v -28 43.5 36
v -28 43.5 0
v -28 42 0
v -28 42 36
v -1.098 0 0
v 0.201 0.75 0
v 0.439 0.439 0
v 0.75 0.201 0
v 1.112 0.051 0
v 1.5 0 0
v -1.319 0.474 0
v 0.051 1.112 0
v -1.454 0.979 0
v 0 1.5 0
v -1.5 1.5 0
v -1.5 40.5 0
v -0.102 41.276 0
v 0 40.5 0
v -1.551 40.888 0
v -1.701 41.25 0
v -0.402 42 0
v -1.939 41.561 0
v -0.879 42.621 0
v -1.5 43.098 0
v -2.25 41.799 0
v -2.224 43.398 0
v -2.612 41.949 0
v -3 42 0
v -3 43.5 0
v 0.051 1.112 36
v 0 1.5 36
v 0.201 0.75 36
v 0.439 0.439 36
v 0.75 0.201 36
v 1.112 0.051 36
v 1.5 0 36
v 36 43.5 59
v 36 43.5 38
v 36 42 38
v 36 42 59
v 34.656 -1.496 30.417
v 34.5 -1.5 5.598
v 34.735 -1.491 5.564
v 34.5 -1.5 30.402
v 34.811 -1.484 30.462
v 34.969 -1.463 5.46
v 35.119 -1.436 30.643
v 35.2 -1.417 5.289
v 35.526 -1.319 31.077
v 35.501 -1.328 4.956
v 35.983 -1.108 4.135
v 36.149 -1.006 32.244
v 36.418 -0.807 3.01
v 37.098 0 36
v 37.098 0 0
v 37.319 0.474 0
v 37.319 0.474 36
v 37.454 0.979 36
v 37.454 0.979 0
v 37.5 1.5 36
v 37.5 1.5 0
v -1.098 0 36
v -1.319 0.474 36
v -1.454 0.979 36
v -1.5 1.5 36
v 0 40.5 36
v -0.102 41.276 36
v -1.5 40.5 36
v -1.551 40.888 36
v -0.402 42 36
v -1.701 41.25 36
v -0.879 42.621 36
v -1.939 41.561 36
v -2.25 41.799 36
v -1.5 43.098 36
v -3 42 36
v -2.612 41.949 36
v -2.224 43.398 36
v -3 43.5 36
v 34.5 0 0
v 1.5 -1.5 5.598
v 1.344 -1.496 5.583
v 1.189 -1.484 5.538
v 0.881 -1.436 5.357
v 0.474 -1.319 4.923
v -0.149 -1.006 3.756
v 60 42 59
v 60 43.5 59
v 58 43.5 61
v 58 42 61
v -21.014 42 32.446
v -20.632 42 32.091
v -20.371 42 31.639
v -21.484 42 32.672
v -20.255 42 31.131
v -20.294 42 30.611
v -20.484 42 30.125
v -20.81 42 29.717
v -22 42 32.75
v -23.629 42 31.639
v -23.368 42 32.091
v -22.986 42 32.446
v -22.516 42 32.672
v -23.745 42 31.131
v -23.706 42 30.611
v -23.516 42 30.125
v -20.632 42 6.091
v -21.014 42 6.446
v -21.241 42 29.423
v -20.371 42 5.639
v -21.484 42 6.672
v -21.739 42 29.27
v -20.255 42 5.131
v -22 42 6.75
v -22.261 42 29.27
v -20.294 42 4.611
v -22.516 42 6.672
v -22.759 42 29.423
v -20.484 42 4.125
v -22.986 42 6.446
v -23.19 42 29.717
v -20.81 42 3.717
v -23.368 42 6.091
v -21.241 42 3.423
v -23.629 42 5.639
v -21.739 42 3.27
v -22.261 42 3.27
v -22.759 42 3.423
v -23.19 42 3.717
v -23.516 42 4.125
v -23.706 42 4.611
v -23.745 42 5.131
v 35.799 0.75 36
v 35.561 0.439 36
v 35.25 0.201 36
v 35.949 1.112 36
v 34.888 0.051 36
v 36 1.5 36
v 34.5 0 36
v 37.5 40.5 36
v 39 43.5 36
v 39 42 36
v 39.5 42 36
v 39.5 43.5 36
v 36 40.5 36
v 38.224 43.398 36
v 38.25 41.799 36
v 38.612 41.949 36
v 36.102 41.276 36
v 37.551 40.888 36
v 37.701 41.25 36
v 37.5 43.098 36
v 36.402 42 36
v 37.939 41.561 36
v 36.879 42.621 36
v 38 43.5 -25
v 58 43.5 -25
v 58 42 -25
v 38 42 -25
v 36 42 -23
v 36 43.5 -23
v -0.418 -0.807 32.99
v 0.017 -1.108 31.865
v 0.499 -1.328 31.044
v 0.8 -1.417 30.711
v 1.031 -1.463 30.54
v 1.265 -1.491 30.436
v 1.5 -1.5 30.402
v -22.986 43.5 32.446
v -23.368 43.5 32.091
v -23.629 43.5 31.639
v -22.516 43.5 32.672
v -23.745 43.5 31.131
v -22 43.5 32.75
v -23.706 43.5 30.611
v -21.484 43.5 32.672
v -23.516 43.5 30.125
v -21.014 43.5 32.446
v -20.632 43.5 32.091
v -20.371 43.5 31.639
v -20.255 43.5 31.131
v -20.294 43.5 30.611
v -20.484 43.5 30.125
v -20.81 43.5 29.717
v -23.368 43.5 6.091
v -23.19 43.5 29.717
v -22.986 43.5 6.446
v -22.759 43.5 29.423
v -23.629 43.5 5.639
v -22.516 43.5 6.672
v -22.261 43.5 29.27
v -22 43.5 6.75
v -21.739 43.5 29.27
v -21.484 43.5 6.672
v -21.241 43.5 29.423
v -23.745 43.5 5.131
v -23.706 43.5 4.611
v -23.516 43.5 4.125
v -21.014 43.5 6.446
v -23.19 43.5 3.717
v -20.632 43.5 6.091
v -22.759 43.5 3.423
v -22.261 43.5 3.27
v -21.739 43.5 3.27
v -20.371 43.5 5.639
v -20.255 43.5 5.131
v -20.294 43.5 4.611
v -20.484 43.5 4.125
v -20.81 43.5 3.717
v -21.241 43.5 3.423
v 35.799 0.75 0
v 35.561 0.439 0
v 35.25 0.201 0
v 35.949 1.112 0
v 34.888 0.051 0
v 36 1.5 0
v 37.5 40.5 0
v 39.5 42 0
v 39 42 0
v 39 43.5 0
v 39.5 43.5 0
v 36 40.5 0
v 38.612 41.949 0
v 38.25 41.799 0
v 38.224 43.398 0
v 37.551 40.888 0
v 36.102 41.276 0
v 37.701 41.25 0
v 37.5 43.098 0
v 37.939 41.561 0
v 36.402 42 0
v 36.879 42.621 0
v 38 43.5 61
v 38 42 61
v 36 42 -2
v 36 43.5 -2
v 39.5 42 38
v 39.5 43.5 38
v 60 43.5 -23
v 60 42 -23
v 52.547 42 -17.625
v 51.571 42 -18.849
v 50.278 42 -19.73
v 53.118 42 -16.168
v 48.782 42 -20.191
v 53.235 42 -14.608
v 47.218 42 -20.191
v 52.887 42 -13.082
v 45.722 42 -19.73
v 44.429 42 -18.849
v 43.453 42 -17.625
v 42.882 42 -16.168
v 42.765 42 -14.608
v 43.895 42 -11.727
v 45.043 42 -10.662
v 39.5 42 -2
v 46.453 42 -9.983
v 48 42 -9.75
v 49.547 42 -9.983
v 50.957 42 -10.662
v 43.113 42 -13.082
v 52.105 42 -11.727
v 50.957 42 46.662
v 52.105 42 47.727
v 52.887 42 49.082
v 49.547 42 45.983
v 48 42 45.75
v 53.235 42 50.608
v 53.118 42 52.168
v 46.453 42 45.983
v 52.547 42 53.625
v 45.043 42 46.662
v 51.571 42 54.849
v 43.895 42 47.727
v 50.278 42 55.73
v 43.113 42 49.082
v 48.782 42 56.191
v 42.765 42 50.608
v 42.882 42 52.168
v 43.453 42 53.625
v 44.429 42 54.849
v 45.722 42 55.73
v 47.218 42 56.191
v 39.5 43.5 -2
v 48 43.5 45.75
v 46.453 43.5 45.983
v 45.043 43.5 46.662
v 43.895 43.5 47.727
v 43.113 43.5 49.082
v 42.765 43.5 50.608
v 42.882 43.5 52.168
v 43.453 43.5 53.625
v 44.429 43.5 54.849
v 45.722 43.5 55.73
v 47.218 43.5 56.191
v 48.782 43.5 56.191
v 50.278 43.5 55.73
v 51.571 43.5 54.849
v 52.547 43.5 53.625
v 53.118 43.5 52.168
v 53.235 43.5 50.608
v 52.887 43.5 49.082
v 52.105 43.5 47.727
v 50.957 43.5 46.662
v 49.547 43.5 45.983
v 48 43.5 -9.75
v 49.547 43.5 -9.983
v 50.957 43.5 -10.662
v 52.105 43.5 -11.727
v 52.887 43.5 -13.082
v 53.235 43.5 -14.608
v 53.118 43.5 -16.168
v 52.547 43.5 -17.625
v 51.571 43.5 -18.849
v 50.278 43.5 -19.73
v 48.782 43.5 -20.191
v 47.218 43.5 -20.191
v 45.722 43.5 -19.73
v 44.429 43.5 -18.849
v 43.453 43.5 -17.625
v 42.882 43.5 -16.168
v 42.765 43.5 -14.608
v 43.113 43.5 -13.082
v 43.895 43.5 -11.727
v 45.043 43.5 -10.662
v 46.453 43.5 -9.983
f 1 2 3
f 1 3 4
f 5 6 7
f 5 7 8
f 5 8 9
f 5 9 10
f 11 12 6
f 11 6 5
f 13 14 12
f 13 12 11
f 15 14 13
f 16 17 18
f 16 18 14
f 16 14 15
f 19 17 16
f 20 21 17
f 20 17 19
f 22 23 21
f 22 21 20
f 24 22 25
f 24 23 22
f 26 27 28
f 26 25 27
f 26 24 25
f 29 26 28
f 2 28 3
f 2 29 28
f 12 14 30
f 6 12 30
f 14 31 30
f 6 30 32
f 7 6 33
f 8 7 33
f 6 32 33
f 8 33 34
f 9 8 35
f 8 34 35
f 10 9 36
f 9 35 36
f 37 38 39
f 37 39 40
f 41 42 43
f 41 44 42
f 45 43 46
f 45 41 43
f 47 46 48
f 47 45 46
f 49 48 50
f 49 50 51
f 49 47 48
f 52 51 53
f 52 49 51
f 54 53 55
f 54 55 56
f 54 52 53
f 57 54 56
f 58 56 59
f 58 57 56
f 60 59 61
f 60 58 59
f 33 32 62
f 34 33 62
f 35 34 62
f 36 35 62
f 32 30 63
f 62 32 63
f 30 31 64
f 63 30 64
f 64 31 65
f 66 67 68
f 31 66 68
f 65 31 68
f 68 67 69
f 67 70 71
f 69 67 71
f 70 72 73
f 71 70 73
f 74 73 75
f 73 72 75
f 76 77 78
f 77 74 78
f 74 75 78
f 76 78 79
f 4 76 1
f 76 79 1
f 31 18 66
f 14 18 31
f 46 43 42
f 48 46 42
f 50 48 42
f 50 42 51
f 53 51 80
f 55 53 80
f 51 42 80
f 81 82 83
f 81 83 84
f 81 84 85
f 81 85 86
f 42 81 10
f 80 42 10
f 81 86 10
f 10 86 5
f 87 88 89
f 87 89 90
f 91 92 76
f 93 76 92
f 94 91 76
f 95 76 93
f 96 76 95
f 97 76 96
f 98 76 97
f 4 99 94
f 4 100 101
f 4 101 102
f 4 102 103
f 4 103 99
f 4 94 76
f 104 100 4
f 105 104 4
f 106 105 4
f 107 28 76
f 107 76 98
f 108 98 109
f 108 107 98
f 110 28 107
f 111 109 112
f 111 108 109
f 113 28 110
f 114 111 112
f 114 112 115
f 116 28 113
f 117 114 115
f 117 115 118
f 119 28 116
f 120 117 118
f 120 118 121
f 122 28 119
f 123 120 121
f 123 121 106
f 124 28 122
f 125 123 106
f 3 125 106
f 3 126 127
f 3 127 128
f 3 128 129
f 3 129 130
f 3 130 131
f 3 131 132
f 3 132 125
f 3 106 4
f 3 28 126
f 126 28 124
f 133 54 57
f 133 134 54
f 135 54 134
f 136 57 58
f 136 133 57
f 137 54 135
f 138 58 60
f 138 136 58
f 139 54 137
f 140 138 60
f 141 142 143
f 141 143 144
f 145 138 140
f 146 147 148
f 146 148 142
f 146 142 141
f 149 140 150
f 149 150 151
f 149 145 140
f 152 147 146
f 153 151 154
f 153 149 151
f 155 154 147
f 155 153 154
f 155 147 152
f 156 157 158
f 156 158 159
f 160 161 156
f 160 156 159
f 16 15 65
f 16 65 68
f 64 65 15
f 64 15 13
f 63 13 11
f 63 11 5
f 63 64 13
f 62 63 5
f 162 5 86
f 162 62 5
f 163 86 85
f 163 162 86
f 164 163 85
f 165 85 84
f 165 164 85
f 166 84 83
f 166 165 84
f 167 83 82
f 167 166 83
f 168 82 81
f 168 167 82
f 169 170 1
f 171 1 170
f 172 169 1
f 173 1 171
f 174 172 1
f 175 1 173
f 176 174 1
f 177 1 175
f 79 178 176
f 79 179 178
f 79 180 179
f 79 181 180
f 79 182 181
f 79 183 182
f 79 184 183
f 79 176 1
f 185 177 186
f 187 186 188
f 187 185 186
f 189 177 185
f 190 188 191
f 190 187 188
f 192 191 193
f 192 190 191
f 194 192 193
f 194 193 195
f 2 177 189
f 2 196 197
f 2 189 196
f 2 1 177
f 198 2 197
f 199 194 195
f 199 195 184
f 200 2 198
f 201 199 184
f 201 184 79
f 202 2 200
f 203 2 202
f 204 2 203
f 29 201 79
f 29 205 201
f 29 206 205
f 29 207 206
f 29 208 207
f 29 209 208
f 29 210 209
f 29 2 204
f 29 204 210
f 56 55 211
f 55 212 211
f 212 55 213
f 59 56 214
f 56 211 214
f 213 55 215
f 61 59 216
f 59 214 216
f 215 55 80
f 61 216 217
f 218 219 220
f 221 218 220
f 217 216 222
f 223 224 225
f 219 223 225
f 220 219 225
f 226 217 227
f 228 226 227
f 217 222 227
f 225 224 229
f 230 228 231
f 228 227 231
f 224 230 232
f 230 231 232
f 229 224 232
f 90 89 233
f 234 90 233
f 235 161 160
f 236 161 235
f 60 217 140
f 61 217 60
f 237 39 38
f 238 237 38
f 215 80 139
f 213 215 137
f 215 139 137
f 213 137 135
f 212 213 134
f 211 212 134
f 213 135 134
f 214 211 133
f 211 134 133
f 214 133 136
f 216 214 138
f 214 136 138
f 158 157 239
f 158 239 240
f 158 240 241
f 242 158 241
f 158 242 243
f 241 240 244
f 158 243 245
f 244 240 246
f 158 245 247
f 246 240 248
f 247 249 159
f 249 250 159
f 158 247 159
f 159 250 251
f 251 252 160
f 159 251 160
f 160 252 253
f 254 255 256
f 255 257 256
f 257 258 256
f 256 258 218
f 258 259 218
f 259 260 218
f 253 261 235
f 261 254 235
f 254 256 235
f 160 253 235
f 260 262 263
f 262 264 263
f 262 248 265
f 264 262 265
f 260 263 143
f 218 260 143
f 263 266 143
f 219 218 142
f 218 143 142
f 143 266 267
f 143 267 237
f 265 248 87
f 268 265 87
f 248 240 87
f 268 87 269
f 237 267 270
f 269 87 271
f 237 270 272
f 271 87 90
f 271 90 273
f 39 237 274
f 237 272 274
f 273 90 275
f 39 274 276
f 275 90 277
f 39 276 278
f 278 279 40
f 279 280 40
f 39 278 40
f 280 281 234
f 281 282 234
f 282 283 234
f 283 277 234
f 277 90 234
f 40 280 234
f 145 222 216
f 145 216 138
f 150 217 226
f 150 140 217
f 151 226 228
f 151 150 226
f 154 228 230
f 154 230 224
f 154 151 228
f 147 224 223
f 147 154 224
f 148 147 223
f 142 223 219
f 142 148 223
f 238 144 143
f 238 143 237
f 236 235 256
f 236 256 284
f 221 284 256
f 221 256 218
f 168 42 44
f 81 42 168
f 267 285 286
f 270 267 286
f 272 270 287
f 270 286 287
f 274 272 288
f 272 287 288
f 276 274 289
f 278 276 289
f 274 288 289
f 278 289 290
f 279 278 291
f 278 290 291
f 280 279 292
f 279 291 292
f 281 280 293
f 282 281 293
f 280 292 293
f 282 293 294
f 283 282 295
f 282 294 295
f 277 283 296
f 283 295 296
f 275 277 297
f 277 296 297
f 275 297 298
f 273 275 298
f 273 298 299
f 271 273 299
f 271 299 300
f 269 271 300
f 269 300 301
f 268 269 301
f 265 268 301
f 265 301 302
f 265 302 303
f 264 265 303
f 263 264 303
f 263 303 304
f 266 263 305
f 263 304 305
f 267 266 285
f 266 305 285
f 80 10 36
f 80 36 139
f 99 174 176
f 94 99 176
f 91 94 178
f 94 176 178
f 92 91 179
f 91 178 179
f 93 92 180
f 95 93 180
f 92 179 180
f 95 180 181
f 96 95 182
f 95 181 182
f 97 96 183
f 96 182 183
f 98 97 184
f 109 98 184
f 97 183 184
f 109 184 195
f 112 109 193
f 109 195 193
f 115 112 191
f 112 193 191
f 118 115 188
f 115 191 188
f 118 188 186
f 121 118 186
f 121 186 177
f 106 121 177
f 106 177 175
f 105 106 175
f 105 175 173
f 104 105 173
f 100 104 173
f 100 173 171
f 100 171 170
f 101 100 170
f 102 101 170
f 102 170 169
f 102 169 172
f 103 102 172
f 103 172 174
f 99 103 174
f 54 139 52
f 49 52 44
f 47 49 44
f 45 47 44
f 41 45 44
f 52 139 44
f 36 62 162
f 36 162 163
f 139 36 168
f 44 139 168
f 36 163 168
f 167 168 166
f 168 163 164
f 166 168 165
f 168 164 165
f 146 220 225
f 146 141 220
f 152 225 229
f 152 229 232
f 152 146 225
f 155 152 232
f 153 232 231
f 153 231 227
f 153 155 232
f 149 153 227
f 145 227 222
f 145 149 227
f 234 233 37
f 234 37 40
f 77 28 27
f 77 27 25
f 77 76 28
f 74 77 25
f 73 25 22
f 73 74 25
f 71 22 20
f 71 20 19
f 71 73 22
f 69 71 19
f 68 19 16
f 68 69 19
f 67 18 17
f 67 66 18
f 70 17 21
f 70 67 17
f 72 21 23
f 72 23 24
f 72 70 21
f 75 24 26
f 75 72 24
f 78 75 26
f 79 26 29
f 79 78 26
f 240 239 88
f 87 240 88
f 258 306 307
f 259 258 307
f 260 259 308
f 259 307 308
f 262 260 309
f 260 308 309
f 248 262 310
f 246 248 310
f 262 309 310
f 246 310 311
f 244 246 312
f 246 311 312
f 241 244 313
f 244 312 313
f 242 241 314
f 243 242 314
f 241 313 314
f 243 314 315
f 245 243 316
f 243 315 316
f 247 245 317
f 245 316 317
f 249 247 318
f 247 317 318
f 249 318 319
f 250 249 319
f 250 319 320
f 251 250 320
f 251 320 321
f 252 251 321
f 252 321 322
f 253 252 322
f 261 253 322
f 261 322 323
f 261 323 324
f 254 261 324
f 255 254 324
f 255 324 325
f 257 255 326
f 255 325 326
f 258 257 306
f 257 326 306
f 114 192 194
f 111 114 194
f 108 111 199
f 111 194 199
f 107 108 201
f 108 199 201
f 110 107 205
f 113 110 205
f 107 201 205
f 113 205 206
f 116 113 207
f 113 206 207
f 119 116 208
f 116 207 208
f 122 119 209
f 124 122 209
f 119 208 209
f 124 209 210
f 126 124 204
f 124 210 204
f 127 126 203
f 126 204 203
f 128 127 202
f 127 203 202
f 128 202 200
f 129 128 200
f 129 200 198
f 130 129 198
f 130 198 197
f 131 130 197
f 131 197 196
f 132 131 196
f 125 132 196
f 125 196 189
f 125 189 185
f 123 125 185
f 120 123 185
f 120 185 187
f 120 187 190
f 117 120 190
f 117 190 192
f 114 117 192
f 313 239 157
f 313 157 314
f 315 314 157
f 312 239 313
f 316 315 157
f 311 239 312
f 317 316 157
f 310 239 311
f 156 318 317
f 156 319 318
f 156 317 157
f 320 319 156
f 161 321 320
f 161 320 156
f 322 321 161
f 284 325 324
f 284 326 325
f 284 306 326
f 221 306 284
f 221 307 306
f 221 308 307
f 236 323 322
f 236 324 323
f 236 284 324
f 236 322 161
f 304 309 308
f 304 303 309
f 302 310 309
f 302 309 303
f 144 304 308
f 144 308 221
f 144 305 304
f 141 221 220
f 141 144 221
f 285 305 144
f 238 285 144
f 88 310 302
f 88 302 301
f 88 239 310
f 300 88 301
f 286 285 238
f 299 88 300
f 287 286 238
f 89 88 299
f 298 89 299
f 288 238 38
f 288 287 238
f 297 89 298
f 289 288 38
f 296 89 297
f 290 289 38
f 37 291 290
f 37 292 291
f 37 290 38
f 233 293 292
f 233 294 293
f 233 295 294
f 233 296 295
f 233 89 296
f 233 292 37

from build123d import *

# Parameters (mm, degrees)
EXTRUDE_1_DEPTH     = 36
SKETCH_2_R          = 1.75
CUT_EXTRUDE_1_DEPTH = 35
FILLET_1_R          = 1.5
FILLET_2_R          = 3
CUT_EXTRUDE_5_DEPTH = 50
SKETCH_5_W          = 24
SKETCH_5_H          = 86
SKETCH_5_R          = 5.25
EXTRUDE_2_DEPTH     = 1.5
SKETCH_6_W          = 2
SKETCH_6_H          = 6.336440046
CUT_EXTRUDE_6_DEPTH = 3.5
FILLET_3_R          = 1.5
FILLET_4_R          = 3
CHAMFER_1_SIZE      = 2
SKETCH_7_W          = 36
SKETCH_7_H          = 1.5
CUT_EXTRUDE_7_DEPTH = 4


with BuildPart() as part:
    # Эскиз1 → Вытянуть1 (new body)
    with BuildSketch(Plane.XY):
        Polygon((-32, 43.5), (0, 43.5), (0, 0), (36, 0), (36, 43.5), (60, 43.5), (60, 42), (37.5, 42), (37.5, -1.5), (-1.5, -1.5), (-1.5, 42), (-32, 42), align=None)
    extrude(amount=EXTRUDE_1_DEPTH)

    # Эскиз2 → Вырез-Вытянуть1 (cut)
    with BuildSketch(Plane(origin=(0, 43.5, 0), x_dir=(-1, 0, 0), z_dir=(0, 1, 0))):
        with Locations(Location((22, 5, 0), (0, 0, 90))):
            Circle(SKETCH_2_R)
        with Locations(Location((22, 31, 0), (0, 0, 90))):
            Circle(SKETCH_2_R)
    extrude(amount=-CUT_EXTRUDE_1_DEPTH, mode=Mode.SUBTRACT)

    # Скругление1
    fillet_1_edges = [part.edges().sort_by_distance(p)[0] for p in [
        (0, 0, 18),
        (36, 0, 18),
        (-1.5, 42, 18),
    ]]
    fillet(fillet_1_edges, radius=FILLET_1_R)

    # Скругление2
    fillet_2_edges = [part.edges().sort_by_distance(p)[0] for p in [
        (0, 43.5, 18),
        (37.5, -1.5, 18),
        (-1.5, -1.5, 18),
    ]]
    fillet(fillet_2_edges, radius=FILLET_2_R)

    # Эскиз4 → Вырез-Вытянуть5 (cut)
    with BuildSketch(Plane.ZY.offset(1.5)):
        Polygon((36, 0), (30.401923789, -1.5), (5.598076211, -1.5), (0, 0), (0, -9.726752533), (36, -8.93099636), align=None)
    extrude(amount=-CUT_EXTRUDE_5_DEPTH, mode=Mode.SUBTRACT)

    # Эскиз5 → Вытянуть2 (add)
    with BuildSketch(Plane(origin=(0, 43.5, 0), x_dir=(-1, 0, 0), z_dir=(0, 1, 0))):
        with Locations((-48, 18)):
            Rectangle(SKETCH_5_W, SKETCH_5_H)
        with Locations(Location((-48, -15, 0), (0, 0, 90))):
            Circle(SKETCH_5_R, mode=Mode.SUBTRACT)
        with Locations(Location((-48, 51, 0), (0, 0, 270))):
            Circle(SKETCH_5_R, mode=Mode.SUBTRACT)
    extrude(amount=-EXTRUDE_2_DEPTH)

    # Эскиз6 → Вырез-Вытянуть6 (cut)
    with BuildSketch(Plane.ZY.offset(-36)):
        with Locations((37, 42.938728947)):
            Rectangle(SKETCH_6_W, SKETCH_6_H)
        with Locations((-1, 42.938728947)):
            Rectangle(SKETCH_6_W, SKETCH_6_H)
    extrude(amount=-CUT_EXTRUDE_6_DEPTH, mode=Mode.SUBTRACT)

    # Скругление3
    fillet_3_edges = [part.edges().sort_by_distance(p)[0] for p in [
        (37.5, 42, 18),
    ]]
    fillet(fillet_3_edges, radius=FILLET_3_R)

    # Скругление4
    fillet_4_edges = [part.edges().sort_by_distance(p)[0] for p in [
        (36, 43.5, 18),
    ]]
    fillet(fillet_4_edges, radius=FILLET_4_R)

    # Фаска1
    chamfer_1_edges = [part.edges().sort_by_distance(p)[0] for p in [
        (36, 42.75, 61),
        (36, 42.75, -25),
        (60, 42.75, -25),
        (60, 42.75, 61),
    ]]
    chamfer(chamfer_1_edges, length=CHAMFER_1_SIZE)

    # Эскиз7 → Вырез-Вытянуть7 (cut)
    with BuildSketch(Plane.ZY.offset(32)):
        with Locations((18, 42.75)):
            Rectangle(SKETCH_7_W, SKETCH_7_H)
    extrude(amount=-CUT_EXTRUDE_7_DEPTH, mode=Mode.SUBTRACT)


solid = part.part
